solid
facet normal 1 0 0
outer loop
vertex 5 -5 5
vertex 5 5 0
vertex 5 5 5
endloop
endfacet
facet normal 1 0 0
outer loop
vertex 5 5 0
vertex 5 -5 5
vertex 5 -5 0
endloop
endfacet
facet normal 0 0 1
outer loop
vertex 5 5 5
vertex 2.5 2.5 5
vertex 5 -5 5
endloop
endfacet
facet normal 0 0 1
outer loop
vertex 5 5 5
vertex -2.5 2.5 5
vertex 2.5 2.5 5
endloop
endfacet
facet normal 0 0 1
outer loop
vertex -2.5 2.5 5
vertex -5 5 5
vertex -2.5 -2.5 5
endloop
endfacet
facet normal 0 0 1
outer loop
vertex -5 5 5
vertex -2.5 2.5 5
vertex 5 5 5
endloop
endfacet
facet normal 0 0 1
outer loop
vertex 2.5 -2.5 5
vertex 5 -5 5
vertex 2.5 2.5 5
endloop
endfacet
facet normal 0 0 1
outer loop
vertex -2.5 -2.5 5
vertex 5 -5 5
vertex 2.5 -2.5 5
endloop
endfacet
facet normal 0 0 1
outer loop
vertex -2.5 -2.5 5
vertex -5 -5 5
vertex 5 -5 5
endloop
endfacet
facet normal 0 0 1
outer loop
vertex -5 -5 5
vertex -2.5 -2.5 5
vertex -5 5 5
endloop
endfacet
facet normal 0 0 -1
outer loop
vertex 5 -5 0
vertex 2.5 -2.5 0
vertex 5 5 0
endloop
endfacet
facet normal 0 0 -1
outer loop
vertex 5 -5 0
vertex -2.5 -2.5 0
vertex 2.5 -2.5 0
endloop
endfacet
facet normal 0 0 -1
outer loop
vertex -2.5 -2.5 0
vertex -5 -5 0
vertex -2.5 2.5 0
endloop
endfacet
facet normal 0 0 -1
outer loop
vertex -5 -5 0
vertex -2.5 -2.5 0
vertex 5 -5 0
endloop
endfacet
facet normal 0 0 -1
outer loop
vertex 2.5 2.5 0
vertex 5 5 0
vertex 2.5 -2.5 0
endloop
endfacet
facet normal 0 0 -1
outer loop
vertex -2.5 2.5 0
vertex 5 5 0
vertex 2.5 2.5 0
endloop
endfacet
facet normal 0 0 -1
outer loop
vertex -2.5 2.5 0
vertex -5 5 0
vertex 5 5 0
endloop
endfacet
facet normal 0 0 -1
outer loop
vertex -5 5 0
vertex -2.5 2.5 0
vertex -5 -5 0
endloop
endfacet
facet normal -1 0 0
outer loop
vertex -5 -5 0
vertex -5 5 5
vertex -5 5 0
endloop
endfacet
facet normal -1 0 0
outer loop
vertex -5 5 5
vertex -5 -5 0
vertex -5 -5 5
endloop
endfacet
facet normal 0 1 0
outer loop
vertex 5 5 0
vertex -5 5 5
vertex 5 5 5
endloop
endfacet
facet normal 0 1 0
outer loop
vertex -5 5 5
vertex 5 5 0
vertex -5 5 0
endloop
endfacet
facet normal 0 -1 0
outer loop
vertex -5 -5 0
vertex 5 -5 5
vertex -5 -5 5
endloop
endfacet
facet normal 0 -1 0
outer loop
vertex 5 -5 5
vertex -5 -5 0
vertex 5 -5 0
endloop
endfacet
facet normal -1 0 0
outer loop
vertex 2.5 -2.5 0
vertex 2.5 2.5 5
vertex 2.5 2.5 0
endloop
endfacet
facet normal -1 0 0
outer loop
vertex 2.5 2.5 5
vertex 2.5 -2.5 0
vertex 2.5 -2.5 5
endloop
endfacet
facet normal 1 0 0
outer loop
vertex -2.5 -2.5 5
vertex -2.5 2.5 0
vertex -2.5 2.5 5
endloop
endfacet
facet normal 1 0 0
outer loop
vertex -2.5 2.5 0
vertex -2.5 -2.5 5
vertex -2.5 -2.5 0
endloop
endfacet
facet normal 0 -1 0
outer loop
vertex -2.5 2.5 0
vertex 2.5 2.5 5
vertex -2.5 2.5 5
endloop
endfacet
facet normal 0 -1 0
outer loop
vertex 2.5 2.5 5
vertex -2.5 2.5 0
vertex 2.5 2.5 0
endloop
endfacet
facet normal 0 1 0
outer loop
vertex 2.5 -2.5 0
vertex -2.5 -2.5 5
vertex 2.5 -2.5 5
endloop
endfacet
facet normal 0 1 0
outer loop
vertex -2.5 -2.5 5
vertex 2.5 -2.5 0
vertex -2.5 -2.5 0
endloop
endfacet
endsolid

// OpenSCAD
//diameter: .76in 19.4mm
//wall diam: 1.2mm
//prong width 4.7mm

//date: 2024 september 13
//purpose: confirm units of printed versions of openscad -> stl models
h = 5;
sqw = 5; // .5 cm thickness
w = 140;
i = 10;
//for ( i = [10 : 20 : w]) {
    //cube params: [w, d, h]
    difference() {
        translate([-i/2, -i/2, 0]) cube([i , i , h]);
        translate([-(i - sqw)/2, -(i - sqw)/2, 0]) cube([i - sqw , i - sqw, h]);
    }   
//}
